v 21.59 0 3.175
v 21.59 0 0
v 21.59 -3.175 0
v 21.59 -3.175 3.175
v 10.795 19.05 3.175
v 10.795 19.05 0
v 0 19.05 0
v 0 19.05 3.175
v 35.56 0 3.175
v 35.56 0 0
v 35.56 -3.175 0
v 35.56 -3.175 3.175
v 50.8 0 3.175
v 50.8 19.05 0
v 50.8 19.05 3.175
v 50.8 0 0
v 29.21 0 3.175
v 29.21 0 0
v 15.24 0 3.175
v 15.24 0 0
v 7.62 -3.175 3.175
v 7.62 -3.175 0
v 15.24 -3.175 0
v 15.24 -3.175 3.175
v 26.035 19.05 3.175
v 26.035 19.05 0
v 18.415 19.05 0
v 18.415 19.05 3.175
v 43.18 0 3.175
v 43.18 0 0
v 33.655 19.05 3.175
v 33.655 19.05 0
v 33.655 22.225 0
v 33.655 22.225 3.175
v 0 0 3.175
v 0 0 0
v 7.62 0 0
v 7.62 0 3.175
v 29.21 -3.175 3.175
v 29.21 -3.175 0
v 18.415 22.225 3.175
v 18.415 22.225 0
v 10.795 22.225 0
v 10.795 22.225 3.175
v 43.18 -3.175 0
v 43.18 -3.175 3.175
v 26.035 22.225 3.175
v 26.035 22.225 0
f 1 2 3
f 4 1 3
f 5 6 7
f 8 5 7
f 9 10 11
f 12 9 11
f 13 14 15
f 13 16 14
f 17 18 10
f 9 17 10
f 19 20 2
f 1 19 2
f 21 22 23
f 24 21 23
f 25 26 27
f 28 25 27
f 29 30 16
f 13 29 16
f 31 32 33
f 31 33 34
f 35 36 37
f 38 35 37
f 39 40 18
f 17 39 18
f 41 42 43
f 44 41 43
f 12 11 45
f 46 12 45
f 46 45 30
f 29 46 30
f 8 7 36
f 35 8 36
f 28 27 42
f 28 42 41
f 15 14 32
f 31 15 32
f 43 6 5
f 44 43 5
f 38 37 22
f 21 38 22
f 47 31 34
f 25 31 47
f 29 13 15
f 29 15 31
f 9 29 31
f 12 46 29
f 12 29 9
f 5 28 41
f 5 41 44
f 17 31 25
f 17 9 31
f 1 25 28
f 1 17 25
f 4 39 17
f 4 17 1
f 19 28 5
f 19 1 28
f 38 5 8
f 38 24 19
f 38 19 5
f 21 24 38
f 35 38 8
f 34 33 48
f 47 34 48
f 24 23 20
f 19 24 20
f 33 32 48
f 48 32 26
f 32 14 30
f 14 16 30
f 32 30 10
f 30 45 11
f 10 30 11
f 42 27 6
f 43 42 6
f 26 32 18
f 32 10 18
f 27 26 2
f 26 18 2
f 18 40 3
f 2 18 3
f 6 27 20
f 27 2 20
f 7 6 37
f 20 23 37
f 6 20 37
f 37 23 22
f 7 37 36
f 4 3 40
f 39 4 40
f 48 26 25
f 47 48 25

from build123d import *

# Parameters (mm, degrees)
F1_DEPTH = 3.175
F2_DEPTH = 9.525
F3_DEPTH = 9.525
F4_DEPTH = 6.35


with BuildPart() as f1:
    # F0 (on Top) → F1 (new body)
    with BuildSketch(Plane.XY):
        Polygon((0, 12.7), (0, 0), (7.62, 0), (7.62, -12.7), (15.24, -12.7), (15.24, 0), (21.59, 0), (21.59, -12.7), (29.21, -12.7), (29.21, 0), (35.56, 0), (35.56, -12.7), (43.18, -12.7), (43.18, 0), (50.8, 0), (50.8, 12.7), (33.655, 12.7), (33.655, 25.4), (26.035, 25.4), (26.035, 12.7), (18.415, 12.7), (18.415, 25.4), (10.795, 25.4), (10.795, 12.7), align=None)
    extrude(amount=F1_DEPTH)

    # F2 (cut): faces of the model
    f2_faces = [f1.faces().sort_by_distance(p)[0] for p in [
        (14.605, 25.4, 1.5875),
        (29.845, 25.4, 1.5875),
    ]]
    extrude(f2_faces, amount=-F2_DEPTH, mode=Mode.SUBTRACT)

    # F3 (cut): faces of the model
    f3_faces = [f1.faces().sort_by_distance(p)[0] for p in [
        (39.37, -12.7, 1.5875),
        (25.4, -12.7, 1.5875),
        (11.43, -12.7, 1.5875),
    ]]
    extrude(f3_faces, amount=-F3_DEPTH, mode=Mode.SUBTRACT)

    # F4 (add): faces of the model
    f4_faces = [f1.faces().sort_by_distance(p)[0] for p in [
        (42.2275, 12.7, 1.5875),
        (29.845, 15.875, 1.5875),
        (22.225, 12.7, 1.5875),
        (14.605, 15.875, 1.5875),
        (5.3975, 12.7, 1.5875),
    ]]
    extrude(f4_faces, amount=F4_DEPTH)


solid = f1.part
